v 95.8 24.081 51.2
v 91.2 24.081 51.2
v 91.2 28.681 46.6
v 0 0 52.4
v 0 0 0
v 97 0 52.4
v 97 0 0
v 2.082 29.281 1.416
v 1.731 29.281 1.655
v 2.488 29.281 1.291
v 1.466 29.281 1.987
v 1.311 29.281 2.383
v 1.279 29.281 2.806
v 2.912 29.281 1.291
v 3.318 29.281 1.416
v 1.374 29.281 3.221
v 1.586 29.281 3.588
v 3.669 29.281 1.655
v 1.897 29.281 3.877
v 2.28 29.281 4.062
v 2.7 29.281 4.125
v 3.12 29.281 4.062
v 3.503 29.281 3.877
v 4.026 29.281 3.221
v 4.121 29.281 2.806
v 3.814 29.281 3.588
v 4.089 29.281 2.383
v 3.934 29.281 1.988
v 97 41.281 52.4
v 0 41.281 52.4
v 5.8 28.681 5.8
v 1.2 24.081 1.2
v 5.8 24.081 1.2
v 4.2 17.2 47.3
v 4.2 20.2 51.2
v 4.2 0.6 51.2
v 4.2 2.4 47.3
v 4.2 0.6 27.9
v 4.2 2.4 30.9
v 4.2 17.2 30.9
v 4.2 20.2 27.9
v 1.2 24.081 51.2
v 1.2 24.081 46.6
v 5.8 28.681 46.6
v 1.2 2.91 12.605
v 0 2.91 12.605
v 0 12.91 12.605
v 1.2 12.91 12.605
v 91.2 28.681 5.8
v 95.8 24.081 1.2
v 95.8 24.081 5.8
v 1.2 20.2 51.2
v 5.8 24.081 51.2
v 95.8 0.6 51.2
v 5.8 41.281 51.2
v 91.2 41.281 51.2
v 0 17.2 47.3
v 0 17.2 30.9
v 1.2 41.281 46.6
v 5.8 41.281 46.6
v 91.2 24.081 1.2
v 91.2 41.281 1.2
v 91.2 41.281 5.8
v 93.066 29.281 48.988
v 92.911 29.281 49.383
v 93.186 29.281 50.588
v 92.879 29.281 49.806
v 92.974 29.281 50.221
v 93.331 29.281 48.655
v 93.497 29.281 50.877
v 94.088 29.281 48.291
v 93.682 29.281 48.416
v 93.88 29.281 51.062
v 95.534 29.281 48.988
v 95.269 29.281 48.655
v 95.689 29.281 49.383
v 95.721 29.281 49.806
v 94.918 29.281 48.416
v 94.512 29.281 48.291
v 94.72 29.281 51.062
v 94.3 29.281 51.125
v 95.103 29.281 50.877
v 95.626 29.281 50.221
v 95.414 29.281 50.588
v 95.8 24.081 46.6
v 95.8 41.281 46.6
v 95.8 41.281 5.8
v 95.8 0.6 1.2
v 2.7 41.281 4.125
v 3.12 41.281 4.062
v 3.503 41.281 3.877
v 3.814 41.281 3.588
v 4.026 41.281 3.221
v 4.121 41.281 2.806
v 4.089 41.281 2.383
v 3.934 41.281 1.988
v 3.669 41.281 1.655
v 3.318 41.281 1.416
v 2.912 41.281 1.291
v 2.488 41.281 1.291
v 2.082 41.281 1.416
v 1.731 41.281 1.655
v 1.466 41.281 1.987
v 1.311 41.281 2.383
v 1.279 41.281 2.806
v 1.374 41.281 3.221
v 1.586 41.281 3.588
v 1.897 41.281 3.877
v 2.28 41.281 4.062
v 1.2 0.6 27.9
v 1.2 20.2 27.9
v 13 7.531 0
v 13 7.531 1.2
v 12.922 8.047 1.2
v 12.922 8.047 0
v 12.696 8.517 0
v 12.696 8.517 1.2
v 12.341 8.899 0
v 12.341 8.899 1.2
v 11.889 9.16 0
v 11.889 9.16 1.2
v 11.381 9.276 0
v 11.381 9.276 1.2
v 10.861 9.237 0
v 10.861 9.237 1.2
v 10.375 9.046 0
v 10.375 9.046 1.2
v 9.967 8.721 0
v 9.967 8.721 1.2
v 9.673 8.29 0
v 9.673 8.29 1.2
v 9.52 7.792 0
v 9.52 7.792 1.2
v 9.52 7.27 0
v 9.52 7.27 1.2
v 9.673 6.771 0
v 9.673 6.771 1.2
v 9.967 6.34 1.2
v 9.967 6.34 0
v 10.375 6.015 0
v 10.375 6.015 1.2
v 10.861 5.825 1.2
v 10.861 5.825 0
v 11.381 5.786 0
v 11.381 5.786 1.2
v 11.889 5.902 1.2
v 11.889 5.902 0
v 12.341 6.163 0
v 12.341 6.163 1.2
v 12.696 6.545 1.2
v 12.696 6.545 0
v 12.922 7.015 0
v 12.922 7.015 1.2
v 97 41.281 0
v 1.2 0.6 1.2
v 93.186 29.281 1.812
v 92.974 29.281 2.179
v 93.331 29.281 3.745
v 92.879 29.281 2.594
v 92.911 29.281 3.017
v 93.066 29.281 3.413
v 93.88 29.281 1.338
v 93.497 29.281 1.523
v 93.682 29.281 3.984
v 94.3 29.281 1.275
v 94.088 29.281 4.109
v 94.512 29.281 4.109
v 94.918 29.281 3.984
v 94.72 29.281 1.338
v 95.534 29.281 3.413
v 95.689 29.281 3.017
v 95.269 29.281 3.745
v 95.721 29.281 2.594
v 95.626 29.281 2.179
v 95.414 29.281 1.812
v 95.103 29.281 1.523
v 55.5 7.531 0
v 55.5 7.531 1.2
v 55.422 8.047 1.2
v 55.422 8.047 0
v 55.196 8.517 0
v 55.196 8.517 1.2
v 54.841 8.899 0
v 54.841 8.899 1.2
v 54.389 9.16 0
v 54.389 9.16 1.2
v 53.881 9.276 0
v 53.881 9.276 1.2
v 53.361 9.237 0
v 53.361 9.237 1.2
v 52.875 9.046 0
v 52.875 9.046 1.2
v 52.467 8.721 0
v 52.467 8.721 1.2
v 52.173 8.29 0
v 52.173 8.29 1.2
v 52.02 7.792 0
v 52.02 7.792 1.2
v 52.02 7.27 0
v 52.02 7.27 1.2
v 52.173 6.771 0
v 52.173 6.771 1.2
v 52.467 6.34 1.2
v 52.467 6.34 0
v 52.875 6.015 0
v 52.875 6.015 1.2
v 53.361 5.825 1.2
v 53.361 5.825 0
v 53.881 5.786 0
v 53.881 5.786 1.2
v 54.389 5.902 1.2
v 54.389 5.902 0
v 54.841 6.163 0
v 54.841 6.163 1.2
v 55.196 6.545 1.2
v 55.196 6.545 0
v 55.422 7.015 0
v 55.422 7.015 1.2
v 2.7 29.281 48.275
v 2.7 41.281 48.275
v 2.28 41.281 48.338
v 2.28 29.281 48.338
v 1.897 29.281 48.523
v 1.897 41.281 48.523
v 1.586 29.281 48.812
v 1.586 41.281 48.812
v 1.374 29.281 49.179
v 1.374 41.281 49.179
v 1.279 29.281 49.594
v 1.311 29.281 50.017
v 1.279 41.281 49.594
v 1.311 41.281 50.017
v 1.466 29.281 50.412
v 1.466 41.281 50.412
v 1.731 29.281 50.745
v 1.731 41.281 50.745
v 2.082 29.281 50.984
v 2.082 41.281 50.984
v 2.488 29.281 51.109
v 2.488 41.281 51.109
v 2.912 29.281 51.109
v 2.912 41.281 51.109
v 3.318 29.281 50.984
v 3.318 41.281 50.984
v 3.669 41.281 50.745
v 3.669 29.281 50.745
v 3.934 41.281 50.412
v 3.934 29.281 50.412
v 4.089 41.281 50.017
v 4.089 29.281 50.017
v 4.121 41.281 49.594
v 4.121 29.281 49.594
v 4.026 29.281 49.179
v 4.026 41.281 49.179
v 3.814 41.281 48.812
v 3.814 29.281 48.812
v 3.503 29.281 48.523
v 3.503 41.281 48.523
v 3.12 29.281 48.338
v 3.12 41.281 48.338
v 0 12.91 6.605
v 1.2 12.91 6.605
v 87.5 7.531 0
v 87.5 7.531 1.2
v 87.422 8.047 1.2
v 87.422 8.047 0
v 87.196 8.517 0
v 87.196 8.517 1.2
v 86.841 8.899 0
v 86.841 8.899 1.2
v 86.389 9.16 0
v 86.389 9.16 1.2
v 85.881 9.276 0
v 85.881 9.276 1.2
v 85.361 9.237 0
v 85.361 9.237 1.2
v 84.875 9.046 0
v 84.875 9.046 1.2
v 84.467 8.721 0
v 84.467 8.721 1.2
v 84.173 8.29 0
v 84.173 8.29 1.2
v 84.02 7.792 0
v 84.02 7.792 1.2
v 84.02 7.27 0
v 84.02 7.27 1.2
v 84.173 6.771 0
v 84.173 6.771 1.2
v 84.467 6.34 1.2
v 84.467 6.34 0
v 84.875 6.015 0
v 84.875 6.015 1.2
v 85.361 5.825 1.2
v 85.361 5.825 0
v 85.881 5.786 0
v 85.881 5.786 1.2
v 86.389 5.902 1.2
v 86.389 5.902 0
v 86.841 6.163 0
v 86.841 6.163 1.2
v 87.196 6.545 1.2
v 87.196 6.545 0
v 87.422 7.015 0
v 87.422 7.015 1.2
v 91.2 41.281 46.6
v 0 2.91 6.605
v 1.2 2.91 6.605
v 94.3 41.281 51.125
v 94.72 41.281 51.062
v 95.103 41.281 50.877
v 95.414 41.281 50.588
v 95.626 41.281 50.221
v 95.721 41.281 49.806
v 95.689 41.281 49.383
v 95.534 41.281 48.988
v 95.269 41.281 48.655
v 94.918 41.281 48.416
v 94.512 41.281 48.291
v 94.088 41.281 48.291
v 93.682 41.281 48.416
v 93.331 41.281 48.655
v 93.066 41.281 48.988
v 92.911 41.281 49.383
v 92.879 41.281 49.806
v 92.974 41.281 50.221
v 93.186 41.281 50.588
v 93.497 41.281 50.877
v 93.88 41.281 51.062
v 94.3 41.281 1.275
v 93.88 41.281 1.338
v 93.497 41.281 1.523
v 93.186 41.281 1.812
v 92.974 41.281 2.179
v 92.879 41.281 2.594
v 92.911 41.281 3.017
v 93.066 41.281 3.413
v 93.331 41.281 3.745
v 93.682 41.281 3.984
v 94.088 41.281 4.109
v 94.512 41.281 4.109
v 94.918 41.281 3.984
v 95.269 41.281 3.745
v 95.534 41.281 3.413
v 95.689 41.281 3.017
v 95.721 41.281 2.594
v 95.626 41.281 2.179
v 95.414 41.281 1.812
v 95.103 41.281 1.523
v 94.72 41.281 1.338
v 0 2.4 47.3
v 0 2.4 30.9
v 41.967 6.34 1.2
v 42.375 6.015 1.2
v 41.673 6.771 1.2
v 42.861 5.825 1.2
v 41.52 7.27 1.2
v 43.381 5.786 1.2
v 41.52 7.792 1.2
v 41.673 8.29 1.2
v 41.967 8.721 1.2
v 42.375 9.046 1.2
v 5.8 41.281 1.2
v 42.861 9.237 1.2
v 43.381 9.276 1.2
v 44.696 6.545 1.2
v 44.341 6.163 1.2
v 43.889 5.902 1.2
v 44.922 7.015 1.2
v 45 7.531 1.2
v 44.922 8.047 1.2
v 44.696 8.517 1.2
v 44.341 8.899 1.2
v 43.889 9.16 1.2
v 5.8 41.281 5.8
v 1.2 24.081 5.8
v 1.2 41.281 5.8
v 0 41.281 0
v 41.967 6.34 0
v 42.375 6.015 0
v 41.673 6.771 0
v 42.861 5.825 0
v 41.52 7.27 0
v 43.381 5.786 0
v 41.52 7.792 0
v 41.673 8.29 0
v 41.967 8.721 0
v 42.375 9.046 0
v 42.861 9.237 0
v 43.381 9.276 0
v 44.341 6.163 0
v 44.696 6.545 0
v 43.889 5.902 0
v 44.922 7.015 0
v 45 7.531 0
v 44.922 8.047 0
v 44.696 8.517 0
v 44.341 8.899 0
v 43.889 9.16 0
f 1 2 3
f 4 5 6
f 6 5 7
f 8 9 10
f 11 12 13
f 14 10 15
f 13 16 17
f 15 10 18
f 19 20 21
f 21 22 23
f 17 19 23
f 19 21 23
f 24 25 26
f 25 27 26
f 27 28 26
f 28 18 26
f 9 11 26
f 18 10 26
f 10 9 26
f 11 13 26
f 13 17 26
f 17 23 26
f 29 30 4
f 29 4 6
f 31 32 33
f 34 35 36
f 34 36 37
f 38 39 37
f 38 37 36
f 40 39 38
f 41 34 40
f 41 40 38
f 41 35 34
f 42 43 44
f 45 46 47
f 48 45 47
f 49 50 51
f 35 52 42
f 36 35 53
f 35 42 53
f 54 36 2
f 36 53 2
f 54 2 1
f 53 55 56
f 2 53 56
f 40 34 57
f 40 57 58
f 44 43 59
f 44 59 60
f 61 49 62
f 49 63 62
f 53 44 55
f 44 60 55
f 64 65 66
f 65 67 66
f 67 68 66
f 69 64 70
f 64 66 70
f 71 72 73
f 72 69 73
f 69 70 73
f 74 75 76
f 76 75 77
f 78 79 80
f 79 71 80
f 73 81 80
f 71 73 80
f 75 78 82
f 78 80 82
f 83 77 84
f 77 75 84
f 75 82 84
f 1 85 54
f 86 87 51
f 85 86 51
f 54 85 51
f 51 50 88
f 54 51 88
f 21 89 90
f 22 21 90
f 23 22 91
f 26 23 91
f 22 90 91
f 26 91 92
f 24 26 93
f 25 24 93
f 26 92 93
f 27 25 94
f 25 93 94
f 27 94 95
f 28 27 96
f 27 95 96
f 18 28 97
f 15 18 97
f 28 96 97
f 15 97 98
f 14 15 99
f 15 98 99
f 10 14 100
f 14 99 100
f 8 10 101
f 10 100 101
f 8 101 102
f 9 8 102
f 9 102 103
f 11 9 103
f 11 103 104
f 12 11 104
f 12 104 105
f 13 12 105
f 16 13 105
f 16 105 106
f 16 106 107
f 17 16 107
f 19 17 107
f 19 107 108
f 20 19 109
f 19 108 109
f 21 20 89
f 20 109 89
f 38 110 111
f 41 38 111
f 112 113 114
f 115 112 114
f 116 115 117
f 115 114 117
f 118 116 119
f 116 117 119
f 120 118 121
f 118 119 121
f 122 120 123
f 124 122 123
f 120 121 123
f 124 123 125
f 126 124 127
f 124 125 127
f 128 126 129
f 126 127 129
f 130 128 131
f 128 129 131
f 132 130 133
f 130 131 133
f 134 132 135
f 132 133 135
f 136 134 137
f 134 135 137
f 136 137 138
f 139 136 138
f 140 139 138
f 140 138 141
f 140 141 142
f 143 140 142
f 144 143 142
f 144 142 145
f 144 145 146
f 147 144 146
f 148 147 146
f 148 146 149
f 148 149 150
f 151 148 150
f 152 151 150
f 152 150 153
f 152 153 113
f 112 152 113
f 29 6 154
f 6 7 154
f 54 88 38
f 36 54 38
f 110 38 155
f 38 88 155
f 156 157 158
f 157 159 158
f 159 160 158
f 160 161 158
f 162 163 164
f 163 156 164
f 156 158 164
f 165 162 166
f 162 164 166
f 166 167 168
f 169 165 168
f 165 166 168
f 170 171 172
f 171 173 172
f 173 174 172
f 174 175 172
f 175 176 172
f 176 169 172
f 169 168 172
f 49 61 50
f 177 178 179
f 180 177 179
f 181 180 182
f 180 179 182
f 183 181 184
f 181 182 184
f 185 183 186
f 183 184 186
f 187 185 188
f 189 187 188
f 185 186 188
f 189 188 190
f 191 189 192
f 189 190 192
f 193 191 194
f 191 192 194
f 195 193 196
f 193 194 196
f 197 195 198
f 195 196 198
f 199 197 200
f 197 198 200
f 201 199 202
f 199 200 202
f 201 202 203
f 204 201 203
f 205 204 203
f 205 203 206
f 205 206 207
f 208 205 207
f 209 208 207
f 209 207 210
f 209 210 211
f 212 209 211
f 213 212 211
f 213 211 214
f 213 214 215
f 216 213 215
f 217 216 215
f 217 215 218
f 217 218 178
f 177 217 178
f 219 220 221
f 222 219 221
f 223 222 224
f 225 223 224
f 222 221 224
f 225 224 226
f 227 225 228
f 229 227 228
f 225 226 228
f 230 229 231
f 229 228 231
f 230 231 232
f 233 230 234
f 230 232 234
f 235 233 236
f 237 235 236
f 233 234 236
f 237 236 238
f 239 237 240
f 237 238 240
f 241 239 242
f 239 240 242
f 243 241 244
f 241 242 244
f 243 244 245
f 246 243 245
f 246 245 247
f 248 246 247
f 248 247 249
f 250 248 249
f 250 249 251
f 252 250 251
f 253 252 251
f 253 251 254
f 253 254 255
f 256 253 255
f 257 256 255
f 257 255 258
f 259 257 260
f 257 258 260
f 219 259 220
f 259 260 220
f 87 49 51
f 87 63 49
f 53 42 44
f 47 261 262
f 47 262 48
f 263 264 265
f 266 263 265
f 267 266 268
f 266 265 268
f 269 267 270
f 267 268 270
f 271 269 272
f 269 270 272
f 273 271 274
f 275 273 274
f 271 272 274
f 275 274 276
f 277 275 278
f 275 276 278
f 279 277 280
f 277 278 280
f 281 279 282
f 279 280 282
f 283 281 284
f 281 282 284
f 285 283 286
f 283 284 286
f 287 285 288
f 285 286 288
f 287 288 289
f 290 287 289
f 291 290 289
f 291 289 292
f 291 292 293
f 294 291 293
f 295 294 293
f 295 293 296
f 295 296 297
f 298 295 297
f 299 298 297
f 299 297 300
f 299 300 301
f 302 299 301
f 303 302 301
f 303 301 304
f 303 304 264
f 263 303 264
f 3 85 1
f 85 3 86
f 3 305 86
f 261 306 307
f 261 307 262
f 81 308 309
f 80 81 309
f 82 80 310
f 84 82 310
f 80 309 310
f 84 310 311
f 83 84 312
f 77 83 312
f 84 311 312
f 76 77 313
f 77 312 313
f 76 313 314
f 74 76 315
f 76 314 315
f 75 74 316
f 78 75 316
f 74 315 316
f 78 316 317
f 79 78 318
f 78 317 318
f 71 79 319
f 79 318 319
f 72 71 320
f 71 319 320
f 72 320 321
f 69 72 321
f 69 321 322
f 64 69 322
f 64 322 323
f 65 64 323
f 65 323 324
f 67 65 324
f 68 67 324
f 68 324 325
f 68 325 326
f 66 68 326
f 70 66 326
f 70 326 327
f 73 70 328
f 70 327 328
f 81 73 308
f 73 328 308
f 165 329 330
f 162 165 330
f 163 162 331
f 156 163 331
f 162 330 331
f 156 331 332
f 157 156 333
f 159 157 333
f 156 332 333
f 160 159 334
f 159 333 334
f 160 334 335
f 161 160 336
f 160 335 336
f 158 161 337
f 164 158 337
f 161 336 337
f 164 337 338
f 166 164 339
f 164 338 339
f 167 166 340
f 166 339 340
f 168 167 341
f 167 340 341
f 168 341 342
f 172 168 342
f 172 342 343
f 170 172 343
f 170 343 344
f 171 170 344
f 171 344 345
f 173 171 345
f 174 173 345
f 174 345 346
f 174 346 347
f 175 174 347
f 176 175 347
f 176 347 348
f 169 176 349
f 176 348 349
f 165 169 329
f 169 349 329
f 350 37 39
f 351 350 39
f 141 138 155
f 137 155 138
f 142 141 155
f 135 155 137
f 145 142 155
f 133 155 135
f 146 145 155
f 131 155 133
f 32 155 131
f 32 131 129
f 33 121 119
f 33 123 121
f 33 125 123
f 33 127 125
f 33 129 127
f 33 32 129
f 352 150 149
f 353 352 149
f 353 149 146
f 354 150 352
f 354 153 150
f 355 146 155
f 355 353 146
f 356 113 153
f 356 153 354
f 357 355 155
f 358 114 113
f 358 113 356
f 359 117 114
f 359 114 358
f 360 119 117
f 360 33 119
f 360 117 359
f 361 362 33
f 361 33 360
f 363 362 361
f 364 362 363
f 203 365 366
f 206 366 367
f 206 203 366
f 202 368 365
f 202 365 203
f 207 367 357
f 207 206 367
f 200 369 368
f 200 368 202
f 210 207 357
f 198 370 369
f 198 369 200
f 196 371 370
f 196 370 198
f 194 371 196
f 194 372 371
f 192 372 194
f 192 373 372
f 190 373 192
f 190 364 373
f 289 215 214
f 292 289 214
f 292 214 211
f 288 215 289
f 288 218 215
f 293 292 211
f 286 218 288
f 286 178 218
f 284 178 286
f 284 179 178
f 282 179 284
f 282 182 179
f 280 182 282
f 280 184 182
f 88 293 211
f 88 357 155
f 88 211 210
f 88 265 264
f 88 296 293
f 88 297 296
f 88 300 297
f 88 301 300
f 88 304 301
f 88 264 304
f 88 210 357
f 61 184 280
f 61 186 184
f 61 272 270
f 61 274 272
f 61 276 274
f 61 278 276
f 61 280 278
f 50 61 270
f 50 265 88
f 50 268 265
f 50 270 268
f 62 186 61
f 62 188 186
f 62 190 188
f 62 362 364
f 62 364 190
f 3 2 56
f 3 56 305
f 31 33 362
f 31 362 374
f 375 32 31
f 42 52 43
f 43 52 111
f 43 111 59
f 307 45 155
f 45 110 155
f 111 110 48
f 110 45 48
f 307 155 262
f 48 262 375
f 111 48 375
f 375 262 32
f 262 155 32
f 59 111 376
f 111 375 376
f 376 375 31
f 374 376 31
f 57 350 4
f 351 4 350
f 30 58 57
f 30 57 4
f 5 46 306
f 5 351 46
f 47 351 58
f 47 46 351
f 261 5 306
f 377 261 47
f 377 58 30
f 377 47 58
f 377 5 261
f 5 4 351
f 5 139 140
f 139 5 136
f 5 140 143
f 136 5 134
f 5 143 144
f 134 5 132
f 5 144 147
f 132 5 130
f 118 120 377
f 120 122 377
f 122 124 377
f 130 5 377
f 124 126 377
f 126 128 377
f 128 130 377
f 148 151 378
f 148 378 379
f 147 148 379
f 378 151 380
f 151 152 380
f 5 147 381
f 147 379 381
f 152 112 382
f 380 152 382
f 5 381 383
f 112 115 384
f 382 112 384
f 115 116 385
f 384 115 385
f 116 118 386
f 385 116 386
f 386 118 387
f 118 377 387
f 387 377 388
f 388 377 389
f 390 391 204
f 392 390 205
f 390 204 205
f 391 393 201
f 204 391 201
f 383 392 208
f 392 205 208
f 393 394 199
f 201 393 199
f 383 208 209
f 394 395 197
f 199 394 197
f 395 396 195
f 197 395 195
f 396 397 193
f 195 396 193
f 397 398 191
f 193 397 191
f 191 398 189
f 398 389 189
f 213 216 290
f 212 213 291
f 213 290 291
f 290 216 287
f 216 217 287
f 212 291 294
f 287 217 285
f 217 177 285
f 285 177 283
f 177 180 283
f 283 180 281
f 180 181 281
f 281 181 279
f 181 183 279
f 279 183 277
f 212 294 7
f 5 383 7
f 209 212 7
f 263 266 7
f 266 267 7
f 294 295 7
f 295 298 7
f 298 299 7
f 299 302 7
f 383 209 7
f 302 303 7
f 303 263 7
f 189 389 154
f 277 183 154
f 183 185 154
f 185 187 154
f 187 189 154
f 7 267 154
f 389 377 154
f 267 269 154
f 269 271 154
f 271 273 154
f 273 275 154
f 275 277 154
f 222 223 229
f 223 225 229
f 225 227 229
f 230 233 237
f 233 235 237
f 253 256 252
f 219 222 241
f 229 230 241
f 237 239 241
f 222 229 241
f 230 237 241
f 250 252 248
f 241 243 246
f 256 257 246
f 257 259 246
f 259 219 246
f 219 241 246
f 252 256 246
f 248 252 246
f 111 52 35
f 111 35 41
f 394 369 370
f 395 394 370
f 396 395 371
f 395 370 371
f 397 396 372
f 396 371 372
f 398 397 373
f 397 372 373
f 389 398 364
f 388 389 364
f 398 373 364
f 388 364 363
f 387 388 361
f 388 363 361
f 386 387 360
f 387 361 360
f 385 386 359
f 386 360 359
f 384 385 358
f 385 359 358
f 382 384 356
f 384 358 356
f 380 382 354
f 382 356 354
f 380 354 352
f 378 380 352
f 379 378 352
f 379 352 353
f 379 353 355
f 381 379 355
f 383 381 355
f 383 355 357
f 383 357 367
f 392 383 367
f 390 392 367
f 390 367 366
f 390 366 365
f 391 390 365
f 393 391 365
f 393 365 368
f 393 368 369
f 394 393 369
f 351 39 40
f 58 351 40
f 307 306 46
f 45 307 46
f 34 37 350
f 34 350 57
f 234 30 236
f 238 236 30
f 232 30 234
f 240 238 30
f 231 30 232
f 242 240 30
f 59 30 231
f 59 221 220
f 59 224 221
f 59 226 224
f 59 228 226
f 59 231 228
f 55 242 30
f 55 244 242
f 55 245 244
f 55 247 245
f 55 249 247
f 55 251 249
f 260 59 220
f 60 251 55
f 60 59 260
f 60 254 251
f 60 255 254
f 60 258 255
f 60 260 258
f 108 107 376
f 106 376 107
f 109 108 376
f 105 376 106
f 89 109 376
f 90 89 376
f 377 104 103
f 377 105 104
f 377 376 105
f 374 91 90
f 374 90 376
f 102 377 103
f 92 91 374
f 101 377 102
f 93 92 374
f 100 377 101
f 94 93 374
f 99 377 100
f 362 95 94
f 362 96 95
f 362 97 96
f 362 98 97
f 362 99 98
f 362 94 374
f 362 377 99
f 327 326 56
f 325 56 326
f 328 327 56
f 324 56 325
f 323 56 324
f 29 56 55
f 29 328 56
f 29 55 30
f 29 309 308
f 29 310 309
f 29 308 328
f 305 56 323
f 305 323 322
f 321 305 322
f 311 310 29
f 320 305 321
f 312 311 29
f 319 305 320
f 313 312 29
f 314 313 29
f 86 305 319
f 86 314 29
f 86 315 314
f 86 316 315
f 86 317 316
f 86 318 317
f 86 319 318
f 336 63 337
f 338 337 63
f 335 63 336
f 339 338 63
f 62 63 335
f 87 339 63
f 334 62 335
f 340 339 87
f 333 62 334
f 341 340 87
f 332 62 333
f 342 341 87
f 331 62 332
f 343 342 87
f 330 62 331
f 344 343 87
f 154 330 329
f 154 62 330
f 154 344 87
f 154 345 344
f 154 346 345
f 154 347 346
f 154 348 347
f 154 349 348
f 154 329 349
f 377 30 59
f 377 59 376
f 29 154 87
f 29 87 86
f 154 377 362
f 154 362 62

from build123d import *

# Parameters (mm, degrees)
SKIZZE1_W                       = 97
SKIZZE1_H                       = 41.280710538
AUFSATZ_LINEAR_AUSTRAGEN1_DEPTH = 1.2
AUFSATZ_LINEAR_AUSTRAGEN2_DEPTH = 50
SKIZZE3_W                       = 23.3
SKIZZE3_H                       = 19.6
SKIZZE3_W_2                     = 16.4
SKIZZE3_H_2                     = 14.8
AUFSATZ_LINEAR_AUSTRAGEN3_DEPTH = 3
SKIZZE3_2_W                     = 16.4
SKIZZE3_2_H                     = 14.8
SCHNITT_LINEAR_AUSTRAGEN1_DEPTH = 117.203171482
SKIZZE5_W                       = 97
SKIZZE5_H                       = 41.280710538
AUFSATZ_LINEAR_AUSTRAGEN4_DEPTH = 1.2
SKIZZE7_W                       = 4.6
SKIZZE7_H                       = 4.6
SKIZZE7_R                       = 1.425
AUFSATZ_LINEAR_AUSTRAGEN5_DEPTH = 12
SKIZZE8_R                       = 1.75
SCHNITT_LINEAR_AUSTRAGEN3_DEPTH = 12
SKIZZE9_W                       = 6
SKIZZE9_H                       = 10
SCHNITT_LINEAR_AUSTRAGEN4_DEPTH = 12
SKIZZE10_W                      = 4.6
SKIZZE10_H                      = 4.6
AUFSATZ_LINEAR_AUSTRAGEN6_DEPTH = 0.6
FASE1_SIZE                      = 4.6


with BuildPart() as part:
    # Skizze1 → Aufsatz-Linear austragen1 (new body)
    with BuildSketch(Plane.XY):
        with Locations((48.5, 20.640355269)):
            Rectangle(SKIZZE1_W, SKIZZE1_H)
    extrude(amount=AUFSATZ_LINEAR_AUSTRAGEN1_DEPTH)

    # Skizze2 → Aufsatz-Linear austragen2 (add)
    with BuildSketch(Plane.XY.offset(1.2)):
        Polygon((0, 41.280710538), (0, 0), (48.5, 0), (97, 0), (97, 41.280710538), (95.8, 41.280710538), (95.8, 0.6), (1.2, 0.6), (1.2, 41.280710538), align=None)
    extrude(amount=AUFSATZ_LINEAR_AUSTRAGEN2_DEPTH)

    # Skizze3 → Aufsatz-Linear austragen3 (add)
    with BuildSketch(Plane(origin=(1.2, 0, 0), x_dir=(0, 0, -1), z_dir=(1, 0, 0))):
        with Locations((-39.55, 10.4)):
            Rectangle(SKIZZE3_W, SKIZZE3_H)
        with Locations((-39.1, 9.8)):
            Rectangle(SKIZZE3_W_2, SKIZZE3_H_2, mode=Mode.SUBTRACT)
    extrude(amount=AUFSATZ_LINEAR_AUSTRAGEN3_DEPTH)

    # Skizze3<2> → Schnitt-Linear austragen1 (cut, through all)
    with BuildSketch(Plane(origin=(1.2, 0, 0), x_dir=(0, 0, -1), z_dir=(1, 0, 0))):
        with Locations((-39.1, 9.8)):
            Rectangle(SKIZZE3_2_W, SKIZZE3_2_H)
    extrude(amount=-SCHNITT_LINEAR_AUSTRAGEN1_DEPTH, mode=Mode.SUBTRACT)

    # Skizze5 → Aufsatz-Linear austragen4 (add)
    with BuildSketch(Plane.XY.offset(51.2)):
        with Locations((48.5, 20.640355269)):
            Rectangle(SKIZZE5_W, SKIZZE5_H)
    extrude(amount=AUFSATZ_LINEAR_AUSTRAGEN4_DEPTH)

    # Skizze7 → Aufsatz-Linear austragen5 (add)
    # profile 1 of 4: a face of its own
    with BuildSketch(Plane(origin=(0, 41.280710538, 0), x_dir=(1, 0, 0), z_dir=(0, 1, 0))):
        with Locations((3.5, -3.5)):
            Rectangle(SKIZZE7_W, SKIZZE7_H)
        with Locations(Location((2.7, -2.7, 0), (0, 0, 270))):
            Circle(SKIZZE7_R, mode=Mode.SUBTRACT)
    # profile 2 of 4: a face of its own
    with BuildSketch(Plane(origin=(0, 41.280710538, 0), x_dir=(1, 0, 0), z_dir=(0, 1, 0))):
        with Locations((93.5, -3.5)):
            Rectangle(SKIZZE7_W, SKIZZE7_H)
        with Locations(Location((94.3, -2.7, 0), (0, 0, 90))):
            Circle(SKIZZE7_R, mode=Mode.SUBTRACT)
    # profile 3 of 4: a face of its own
    with BuildSketch(Plane(origin=(0, 41.280710538, 0), x_dir=(1, 0, 0), z_dir=(0, 1, 0))):
        with Locations((93.5, -48.9)):
            Rectangle(SKIZZE7_W, SKIZZE7_H)
        with Locations(Location((94.3, -49.7, 0), (0, 0, 270))):
            Circle(SKIZZE7_R, mode=Mode.SUBTRACT)
    # profile 4 of 4: a face of its own
    with BuildSketch(Plane(origin=(0, 41.280710538, 0), x_dir=(1, 0, 0), z_dir=(0, 1, 0))):
        with Locations((3.5, -48.9)):
            Rectangle(SKIZZE7_W, SKIZZE7_H)
        with Locations(Location((2.7, -49.7, 0), (0, 0, 90))):
            Circle(SKIZZE7_R, mode=Mode.SUBTRACT)
    extrude(amount=-AUFSATZ_LINEAR_AUSTRAGEN5_DEPTH)

    # Skizze8 → Schnitt-Linear austragen3 (cut)
    with BuildSketch(Plane.XY.offset(1.2)):
        with Locations((11.25, 7.530710538)):
            Circle(SKIZZE8_R)
        with Locations((43.25, 7.530710538)):
            Circle(SKIZZE8_R)
        with Locations((53.75, 7.530710538)):
            Circle(SKIZZE8_R)
        with Locations((85.75, 7.530710538)):
            Circle(SKIZZE8_R)
    extrude(amount=-SCHNITT_LINEAR_AUSTRAGEN3_DEPTH, mode=Mode.SUBTRACT)

    # Skizze9 → Schnitt-Linear austragen4 (cut)
    with BuildSketch(Plane.ZY):
        with Locations((9.605096132, 7.910310386)):
            Rectangle(SKIZZE9_W, SKIZZE9_H)
    extrude(amount=-SCHNITT_LINEAR_AUSTRAGEN4_DEPTH, mode=Mode.SUBTRACT)

    # Skizze10 → Aufsatz-Linear austragen6 (add)
    with BuildSketch(Plane.XZ.offset(-29.280710538)):
        with Locations((3.5, 48.9)):
            Rectangle(SKIZZE10_W, SKIZZE10_H)
        with Locations((3.5, 3.5)):
            Rectangle(SKIZZE10_W, SKIZZE10_H)
        with Locations((93.5, 48.9)):
            Rectangle(SKIZZE10_W, SKIZZE10_H)
        with Locations((93.5, 3.5)):
            Rectangle(SKIZZE10_W, SKIZZE10_H)
    extrude(amount=AUFSATZ_LINEAR_AUSTRAGEN6_DEPTH)

    # Fase1
    fase1_edges = [part.edges().sort_by_distance(p)[0] for p in [
        (1.2, 28.680710538, 3.5),
        (3.5, 28.680710538, 1.2),
        (93.5, 28.680710538, 1.2),
        (95.8, 28.680710538, 3.5),
        (95.8, 28.680710538, 48.9),
        (93.5, 28.680710538, 51.2),
        (1.2, 28.680710538, 48.9),
        (3.5, 28.680710538, 51.2),
    ]]
    chamfer(fase1_edges, length=FASE1_SIZE - 0.0001)  # a hair under: the kernel refuses the full size


solid = part.part
